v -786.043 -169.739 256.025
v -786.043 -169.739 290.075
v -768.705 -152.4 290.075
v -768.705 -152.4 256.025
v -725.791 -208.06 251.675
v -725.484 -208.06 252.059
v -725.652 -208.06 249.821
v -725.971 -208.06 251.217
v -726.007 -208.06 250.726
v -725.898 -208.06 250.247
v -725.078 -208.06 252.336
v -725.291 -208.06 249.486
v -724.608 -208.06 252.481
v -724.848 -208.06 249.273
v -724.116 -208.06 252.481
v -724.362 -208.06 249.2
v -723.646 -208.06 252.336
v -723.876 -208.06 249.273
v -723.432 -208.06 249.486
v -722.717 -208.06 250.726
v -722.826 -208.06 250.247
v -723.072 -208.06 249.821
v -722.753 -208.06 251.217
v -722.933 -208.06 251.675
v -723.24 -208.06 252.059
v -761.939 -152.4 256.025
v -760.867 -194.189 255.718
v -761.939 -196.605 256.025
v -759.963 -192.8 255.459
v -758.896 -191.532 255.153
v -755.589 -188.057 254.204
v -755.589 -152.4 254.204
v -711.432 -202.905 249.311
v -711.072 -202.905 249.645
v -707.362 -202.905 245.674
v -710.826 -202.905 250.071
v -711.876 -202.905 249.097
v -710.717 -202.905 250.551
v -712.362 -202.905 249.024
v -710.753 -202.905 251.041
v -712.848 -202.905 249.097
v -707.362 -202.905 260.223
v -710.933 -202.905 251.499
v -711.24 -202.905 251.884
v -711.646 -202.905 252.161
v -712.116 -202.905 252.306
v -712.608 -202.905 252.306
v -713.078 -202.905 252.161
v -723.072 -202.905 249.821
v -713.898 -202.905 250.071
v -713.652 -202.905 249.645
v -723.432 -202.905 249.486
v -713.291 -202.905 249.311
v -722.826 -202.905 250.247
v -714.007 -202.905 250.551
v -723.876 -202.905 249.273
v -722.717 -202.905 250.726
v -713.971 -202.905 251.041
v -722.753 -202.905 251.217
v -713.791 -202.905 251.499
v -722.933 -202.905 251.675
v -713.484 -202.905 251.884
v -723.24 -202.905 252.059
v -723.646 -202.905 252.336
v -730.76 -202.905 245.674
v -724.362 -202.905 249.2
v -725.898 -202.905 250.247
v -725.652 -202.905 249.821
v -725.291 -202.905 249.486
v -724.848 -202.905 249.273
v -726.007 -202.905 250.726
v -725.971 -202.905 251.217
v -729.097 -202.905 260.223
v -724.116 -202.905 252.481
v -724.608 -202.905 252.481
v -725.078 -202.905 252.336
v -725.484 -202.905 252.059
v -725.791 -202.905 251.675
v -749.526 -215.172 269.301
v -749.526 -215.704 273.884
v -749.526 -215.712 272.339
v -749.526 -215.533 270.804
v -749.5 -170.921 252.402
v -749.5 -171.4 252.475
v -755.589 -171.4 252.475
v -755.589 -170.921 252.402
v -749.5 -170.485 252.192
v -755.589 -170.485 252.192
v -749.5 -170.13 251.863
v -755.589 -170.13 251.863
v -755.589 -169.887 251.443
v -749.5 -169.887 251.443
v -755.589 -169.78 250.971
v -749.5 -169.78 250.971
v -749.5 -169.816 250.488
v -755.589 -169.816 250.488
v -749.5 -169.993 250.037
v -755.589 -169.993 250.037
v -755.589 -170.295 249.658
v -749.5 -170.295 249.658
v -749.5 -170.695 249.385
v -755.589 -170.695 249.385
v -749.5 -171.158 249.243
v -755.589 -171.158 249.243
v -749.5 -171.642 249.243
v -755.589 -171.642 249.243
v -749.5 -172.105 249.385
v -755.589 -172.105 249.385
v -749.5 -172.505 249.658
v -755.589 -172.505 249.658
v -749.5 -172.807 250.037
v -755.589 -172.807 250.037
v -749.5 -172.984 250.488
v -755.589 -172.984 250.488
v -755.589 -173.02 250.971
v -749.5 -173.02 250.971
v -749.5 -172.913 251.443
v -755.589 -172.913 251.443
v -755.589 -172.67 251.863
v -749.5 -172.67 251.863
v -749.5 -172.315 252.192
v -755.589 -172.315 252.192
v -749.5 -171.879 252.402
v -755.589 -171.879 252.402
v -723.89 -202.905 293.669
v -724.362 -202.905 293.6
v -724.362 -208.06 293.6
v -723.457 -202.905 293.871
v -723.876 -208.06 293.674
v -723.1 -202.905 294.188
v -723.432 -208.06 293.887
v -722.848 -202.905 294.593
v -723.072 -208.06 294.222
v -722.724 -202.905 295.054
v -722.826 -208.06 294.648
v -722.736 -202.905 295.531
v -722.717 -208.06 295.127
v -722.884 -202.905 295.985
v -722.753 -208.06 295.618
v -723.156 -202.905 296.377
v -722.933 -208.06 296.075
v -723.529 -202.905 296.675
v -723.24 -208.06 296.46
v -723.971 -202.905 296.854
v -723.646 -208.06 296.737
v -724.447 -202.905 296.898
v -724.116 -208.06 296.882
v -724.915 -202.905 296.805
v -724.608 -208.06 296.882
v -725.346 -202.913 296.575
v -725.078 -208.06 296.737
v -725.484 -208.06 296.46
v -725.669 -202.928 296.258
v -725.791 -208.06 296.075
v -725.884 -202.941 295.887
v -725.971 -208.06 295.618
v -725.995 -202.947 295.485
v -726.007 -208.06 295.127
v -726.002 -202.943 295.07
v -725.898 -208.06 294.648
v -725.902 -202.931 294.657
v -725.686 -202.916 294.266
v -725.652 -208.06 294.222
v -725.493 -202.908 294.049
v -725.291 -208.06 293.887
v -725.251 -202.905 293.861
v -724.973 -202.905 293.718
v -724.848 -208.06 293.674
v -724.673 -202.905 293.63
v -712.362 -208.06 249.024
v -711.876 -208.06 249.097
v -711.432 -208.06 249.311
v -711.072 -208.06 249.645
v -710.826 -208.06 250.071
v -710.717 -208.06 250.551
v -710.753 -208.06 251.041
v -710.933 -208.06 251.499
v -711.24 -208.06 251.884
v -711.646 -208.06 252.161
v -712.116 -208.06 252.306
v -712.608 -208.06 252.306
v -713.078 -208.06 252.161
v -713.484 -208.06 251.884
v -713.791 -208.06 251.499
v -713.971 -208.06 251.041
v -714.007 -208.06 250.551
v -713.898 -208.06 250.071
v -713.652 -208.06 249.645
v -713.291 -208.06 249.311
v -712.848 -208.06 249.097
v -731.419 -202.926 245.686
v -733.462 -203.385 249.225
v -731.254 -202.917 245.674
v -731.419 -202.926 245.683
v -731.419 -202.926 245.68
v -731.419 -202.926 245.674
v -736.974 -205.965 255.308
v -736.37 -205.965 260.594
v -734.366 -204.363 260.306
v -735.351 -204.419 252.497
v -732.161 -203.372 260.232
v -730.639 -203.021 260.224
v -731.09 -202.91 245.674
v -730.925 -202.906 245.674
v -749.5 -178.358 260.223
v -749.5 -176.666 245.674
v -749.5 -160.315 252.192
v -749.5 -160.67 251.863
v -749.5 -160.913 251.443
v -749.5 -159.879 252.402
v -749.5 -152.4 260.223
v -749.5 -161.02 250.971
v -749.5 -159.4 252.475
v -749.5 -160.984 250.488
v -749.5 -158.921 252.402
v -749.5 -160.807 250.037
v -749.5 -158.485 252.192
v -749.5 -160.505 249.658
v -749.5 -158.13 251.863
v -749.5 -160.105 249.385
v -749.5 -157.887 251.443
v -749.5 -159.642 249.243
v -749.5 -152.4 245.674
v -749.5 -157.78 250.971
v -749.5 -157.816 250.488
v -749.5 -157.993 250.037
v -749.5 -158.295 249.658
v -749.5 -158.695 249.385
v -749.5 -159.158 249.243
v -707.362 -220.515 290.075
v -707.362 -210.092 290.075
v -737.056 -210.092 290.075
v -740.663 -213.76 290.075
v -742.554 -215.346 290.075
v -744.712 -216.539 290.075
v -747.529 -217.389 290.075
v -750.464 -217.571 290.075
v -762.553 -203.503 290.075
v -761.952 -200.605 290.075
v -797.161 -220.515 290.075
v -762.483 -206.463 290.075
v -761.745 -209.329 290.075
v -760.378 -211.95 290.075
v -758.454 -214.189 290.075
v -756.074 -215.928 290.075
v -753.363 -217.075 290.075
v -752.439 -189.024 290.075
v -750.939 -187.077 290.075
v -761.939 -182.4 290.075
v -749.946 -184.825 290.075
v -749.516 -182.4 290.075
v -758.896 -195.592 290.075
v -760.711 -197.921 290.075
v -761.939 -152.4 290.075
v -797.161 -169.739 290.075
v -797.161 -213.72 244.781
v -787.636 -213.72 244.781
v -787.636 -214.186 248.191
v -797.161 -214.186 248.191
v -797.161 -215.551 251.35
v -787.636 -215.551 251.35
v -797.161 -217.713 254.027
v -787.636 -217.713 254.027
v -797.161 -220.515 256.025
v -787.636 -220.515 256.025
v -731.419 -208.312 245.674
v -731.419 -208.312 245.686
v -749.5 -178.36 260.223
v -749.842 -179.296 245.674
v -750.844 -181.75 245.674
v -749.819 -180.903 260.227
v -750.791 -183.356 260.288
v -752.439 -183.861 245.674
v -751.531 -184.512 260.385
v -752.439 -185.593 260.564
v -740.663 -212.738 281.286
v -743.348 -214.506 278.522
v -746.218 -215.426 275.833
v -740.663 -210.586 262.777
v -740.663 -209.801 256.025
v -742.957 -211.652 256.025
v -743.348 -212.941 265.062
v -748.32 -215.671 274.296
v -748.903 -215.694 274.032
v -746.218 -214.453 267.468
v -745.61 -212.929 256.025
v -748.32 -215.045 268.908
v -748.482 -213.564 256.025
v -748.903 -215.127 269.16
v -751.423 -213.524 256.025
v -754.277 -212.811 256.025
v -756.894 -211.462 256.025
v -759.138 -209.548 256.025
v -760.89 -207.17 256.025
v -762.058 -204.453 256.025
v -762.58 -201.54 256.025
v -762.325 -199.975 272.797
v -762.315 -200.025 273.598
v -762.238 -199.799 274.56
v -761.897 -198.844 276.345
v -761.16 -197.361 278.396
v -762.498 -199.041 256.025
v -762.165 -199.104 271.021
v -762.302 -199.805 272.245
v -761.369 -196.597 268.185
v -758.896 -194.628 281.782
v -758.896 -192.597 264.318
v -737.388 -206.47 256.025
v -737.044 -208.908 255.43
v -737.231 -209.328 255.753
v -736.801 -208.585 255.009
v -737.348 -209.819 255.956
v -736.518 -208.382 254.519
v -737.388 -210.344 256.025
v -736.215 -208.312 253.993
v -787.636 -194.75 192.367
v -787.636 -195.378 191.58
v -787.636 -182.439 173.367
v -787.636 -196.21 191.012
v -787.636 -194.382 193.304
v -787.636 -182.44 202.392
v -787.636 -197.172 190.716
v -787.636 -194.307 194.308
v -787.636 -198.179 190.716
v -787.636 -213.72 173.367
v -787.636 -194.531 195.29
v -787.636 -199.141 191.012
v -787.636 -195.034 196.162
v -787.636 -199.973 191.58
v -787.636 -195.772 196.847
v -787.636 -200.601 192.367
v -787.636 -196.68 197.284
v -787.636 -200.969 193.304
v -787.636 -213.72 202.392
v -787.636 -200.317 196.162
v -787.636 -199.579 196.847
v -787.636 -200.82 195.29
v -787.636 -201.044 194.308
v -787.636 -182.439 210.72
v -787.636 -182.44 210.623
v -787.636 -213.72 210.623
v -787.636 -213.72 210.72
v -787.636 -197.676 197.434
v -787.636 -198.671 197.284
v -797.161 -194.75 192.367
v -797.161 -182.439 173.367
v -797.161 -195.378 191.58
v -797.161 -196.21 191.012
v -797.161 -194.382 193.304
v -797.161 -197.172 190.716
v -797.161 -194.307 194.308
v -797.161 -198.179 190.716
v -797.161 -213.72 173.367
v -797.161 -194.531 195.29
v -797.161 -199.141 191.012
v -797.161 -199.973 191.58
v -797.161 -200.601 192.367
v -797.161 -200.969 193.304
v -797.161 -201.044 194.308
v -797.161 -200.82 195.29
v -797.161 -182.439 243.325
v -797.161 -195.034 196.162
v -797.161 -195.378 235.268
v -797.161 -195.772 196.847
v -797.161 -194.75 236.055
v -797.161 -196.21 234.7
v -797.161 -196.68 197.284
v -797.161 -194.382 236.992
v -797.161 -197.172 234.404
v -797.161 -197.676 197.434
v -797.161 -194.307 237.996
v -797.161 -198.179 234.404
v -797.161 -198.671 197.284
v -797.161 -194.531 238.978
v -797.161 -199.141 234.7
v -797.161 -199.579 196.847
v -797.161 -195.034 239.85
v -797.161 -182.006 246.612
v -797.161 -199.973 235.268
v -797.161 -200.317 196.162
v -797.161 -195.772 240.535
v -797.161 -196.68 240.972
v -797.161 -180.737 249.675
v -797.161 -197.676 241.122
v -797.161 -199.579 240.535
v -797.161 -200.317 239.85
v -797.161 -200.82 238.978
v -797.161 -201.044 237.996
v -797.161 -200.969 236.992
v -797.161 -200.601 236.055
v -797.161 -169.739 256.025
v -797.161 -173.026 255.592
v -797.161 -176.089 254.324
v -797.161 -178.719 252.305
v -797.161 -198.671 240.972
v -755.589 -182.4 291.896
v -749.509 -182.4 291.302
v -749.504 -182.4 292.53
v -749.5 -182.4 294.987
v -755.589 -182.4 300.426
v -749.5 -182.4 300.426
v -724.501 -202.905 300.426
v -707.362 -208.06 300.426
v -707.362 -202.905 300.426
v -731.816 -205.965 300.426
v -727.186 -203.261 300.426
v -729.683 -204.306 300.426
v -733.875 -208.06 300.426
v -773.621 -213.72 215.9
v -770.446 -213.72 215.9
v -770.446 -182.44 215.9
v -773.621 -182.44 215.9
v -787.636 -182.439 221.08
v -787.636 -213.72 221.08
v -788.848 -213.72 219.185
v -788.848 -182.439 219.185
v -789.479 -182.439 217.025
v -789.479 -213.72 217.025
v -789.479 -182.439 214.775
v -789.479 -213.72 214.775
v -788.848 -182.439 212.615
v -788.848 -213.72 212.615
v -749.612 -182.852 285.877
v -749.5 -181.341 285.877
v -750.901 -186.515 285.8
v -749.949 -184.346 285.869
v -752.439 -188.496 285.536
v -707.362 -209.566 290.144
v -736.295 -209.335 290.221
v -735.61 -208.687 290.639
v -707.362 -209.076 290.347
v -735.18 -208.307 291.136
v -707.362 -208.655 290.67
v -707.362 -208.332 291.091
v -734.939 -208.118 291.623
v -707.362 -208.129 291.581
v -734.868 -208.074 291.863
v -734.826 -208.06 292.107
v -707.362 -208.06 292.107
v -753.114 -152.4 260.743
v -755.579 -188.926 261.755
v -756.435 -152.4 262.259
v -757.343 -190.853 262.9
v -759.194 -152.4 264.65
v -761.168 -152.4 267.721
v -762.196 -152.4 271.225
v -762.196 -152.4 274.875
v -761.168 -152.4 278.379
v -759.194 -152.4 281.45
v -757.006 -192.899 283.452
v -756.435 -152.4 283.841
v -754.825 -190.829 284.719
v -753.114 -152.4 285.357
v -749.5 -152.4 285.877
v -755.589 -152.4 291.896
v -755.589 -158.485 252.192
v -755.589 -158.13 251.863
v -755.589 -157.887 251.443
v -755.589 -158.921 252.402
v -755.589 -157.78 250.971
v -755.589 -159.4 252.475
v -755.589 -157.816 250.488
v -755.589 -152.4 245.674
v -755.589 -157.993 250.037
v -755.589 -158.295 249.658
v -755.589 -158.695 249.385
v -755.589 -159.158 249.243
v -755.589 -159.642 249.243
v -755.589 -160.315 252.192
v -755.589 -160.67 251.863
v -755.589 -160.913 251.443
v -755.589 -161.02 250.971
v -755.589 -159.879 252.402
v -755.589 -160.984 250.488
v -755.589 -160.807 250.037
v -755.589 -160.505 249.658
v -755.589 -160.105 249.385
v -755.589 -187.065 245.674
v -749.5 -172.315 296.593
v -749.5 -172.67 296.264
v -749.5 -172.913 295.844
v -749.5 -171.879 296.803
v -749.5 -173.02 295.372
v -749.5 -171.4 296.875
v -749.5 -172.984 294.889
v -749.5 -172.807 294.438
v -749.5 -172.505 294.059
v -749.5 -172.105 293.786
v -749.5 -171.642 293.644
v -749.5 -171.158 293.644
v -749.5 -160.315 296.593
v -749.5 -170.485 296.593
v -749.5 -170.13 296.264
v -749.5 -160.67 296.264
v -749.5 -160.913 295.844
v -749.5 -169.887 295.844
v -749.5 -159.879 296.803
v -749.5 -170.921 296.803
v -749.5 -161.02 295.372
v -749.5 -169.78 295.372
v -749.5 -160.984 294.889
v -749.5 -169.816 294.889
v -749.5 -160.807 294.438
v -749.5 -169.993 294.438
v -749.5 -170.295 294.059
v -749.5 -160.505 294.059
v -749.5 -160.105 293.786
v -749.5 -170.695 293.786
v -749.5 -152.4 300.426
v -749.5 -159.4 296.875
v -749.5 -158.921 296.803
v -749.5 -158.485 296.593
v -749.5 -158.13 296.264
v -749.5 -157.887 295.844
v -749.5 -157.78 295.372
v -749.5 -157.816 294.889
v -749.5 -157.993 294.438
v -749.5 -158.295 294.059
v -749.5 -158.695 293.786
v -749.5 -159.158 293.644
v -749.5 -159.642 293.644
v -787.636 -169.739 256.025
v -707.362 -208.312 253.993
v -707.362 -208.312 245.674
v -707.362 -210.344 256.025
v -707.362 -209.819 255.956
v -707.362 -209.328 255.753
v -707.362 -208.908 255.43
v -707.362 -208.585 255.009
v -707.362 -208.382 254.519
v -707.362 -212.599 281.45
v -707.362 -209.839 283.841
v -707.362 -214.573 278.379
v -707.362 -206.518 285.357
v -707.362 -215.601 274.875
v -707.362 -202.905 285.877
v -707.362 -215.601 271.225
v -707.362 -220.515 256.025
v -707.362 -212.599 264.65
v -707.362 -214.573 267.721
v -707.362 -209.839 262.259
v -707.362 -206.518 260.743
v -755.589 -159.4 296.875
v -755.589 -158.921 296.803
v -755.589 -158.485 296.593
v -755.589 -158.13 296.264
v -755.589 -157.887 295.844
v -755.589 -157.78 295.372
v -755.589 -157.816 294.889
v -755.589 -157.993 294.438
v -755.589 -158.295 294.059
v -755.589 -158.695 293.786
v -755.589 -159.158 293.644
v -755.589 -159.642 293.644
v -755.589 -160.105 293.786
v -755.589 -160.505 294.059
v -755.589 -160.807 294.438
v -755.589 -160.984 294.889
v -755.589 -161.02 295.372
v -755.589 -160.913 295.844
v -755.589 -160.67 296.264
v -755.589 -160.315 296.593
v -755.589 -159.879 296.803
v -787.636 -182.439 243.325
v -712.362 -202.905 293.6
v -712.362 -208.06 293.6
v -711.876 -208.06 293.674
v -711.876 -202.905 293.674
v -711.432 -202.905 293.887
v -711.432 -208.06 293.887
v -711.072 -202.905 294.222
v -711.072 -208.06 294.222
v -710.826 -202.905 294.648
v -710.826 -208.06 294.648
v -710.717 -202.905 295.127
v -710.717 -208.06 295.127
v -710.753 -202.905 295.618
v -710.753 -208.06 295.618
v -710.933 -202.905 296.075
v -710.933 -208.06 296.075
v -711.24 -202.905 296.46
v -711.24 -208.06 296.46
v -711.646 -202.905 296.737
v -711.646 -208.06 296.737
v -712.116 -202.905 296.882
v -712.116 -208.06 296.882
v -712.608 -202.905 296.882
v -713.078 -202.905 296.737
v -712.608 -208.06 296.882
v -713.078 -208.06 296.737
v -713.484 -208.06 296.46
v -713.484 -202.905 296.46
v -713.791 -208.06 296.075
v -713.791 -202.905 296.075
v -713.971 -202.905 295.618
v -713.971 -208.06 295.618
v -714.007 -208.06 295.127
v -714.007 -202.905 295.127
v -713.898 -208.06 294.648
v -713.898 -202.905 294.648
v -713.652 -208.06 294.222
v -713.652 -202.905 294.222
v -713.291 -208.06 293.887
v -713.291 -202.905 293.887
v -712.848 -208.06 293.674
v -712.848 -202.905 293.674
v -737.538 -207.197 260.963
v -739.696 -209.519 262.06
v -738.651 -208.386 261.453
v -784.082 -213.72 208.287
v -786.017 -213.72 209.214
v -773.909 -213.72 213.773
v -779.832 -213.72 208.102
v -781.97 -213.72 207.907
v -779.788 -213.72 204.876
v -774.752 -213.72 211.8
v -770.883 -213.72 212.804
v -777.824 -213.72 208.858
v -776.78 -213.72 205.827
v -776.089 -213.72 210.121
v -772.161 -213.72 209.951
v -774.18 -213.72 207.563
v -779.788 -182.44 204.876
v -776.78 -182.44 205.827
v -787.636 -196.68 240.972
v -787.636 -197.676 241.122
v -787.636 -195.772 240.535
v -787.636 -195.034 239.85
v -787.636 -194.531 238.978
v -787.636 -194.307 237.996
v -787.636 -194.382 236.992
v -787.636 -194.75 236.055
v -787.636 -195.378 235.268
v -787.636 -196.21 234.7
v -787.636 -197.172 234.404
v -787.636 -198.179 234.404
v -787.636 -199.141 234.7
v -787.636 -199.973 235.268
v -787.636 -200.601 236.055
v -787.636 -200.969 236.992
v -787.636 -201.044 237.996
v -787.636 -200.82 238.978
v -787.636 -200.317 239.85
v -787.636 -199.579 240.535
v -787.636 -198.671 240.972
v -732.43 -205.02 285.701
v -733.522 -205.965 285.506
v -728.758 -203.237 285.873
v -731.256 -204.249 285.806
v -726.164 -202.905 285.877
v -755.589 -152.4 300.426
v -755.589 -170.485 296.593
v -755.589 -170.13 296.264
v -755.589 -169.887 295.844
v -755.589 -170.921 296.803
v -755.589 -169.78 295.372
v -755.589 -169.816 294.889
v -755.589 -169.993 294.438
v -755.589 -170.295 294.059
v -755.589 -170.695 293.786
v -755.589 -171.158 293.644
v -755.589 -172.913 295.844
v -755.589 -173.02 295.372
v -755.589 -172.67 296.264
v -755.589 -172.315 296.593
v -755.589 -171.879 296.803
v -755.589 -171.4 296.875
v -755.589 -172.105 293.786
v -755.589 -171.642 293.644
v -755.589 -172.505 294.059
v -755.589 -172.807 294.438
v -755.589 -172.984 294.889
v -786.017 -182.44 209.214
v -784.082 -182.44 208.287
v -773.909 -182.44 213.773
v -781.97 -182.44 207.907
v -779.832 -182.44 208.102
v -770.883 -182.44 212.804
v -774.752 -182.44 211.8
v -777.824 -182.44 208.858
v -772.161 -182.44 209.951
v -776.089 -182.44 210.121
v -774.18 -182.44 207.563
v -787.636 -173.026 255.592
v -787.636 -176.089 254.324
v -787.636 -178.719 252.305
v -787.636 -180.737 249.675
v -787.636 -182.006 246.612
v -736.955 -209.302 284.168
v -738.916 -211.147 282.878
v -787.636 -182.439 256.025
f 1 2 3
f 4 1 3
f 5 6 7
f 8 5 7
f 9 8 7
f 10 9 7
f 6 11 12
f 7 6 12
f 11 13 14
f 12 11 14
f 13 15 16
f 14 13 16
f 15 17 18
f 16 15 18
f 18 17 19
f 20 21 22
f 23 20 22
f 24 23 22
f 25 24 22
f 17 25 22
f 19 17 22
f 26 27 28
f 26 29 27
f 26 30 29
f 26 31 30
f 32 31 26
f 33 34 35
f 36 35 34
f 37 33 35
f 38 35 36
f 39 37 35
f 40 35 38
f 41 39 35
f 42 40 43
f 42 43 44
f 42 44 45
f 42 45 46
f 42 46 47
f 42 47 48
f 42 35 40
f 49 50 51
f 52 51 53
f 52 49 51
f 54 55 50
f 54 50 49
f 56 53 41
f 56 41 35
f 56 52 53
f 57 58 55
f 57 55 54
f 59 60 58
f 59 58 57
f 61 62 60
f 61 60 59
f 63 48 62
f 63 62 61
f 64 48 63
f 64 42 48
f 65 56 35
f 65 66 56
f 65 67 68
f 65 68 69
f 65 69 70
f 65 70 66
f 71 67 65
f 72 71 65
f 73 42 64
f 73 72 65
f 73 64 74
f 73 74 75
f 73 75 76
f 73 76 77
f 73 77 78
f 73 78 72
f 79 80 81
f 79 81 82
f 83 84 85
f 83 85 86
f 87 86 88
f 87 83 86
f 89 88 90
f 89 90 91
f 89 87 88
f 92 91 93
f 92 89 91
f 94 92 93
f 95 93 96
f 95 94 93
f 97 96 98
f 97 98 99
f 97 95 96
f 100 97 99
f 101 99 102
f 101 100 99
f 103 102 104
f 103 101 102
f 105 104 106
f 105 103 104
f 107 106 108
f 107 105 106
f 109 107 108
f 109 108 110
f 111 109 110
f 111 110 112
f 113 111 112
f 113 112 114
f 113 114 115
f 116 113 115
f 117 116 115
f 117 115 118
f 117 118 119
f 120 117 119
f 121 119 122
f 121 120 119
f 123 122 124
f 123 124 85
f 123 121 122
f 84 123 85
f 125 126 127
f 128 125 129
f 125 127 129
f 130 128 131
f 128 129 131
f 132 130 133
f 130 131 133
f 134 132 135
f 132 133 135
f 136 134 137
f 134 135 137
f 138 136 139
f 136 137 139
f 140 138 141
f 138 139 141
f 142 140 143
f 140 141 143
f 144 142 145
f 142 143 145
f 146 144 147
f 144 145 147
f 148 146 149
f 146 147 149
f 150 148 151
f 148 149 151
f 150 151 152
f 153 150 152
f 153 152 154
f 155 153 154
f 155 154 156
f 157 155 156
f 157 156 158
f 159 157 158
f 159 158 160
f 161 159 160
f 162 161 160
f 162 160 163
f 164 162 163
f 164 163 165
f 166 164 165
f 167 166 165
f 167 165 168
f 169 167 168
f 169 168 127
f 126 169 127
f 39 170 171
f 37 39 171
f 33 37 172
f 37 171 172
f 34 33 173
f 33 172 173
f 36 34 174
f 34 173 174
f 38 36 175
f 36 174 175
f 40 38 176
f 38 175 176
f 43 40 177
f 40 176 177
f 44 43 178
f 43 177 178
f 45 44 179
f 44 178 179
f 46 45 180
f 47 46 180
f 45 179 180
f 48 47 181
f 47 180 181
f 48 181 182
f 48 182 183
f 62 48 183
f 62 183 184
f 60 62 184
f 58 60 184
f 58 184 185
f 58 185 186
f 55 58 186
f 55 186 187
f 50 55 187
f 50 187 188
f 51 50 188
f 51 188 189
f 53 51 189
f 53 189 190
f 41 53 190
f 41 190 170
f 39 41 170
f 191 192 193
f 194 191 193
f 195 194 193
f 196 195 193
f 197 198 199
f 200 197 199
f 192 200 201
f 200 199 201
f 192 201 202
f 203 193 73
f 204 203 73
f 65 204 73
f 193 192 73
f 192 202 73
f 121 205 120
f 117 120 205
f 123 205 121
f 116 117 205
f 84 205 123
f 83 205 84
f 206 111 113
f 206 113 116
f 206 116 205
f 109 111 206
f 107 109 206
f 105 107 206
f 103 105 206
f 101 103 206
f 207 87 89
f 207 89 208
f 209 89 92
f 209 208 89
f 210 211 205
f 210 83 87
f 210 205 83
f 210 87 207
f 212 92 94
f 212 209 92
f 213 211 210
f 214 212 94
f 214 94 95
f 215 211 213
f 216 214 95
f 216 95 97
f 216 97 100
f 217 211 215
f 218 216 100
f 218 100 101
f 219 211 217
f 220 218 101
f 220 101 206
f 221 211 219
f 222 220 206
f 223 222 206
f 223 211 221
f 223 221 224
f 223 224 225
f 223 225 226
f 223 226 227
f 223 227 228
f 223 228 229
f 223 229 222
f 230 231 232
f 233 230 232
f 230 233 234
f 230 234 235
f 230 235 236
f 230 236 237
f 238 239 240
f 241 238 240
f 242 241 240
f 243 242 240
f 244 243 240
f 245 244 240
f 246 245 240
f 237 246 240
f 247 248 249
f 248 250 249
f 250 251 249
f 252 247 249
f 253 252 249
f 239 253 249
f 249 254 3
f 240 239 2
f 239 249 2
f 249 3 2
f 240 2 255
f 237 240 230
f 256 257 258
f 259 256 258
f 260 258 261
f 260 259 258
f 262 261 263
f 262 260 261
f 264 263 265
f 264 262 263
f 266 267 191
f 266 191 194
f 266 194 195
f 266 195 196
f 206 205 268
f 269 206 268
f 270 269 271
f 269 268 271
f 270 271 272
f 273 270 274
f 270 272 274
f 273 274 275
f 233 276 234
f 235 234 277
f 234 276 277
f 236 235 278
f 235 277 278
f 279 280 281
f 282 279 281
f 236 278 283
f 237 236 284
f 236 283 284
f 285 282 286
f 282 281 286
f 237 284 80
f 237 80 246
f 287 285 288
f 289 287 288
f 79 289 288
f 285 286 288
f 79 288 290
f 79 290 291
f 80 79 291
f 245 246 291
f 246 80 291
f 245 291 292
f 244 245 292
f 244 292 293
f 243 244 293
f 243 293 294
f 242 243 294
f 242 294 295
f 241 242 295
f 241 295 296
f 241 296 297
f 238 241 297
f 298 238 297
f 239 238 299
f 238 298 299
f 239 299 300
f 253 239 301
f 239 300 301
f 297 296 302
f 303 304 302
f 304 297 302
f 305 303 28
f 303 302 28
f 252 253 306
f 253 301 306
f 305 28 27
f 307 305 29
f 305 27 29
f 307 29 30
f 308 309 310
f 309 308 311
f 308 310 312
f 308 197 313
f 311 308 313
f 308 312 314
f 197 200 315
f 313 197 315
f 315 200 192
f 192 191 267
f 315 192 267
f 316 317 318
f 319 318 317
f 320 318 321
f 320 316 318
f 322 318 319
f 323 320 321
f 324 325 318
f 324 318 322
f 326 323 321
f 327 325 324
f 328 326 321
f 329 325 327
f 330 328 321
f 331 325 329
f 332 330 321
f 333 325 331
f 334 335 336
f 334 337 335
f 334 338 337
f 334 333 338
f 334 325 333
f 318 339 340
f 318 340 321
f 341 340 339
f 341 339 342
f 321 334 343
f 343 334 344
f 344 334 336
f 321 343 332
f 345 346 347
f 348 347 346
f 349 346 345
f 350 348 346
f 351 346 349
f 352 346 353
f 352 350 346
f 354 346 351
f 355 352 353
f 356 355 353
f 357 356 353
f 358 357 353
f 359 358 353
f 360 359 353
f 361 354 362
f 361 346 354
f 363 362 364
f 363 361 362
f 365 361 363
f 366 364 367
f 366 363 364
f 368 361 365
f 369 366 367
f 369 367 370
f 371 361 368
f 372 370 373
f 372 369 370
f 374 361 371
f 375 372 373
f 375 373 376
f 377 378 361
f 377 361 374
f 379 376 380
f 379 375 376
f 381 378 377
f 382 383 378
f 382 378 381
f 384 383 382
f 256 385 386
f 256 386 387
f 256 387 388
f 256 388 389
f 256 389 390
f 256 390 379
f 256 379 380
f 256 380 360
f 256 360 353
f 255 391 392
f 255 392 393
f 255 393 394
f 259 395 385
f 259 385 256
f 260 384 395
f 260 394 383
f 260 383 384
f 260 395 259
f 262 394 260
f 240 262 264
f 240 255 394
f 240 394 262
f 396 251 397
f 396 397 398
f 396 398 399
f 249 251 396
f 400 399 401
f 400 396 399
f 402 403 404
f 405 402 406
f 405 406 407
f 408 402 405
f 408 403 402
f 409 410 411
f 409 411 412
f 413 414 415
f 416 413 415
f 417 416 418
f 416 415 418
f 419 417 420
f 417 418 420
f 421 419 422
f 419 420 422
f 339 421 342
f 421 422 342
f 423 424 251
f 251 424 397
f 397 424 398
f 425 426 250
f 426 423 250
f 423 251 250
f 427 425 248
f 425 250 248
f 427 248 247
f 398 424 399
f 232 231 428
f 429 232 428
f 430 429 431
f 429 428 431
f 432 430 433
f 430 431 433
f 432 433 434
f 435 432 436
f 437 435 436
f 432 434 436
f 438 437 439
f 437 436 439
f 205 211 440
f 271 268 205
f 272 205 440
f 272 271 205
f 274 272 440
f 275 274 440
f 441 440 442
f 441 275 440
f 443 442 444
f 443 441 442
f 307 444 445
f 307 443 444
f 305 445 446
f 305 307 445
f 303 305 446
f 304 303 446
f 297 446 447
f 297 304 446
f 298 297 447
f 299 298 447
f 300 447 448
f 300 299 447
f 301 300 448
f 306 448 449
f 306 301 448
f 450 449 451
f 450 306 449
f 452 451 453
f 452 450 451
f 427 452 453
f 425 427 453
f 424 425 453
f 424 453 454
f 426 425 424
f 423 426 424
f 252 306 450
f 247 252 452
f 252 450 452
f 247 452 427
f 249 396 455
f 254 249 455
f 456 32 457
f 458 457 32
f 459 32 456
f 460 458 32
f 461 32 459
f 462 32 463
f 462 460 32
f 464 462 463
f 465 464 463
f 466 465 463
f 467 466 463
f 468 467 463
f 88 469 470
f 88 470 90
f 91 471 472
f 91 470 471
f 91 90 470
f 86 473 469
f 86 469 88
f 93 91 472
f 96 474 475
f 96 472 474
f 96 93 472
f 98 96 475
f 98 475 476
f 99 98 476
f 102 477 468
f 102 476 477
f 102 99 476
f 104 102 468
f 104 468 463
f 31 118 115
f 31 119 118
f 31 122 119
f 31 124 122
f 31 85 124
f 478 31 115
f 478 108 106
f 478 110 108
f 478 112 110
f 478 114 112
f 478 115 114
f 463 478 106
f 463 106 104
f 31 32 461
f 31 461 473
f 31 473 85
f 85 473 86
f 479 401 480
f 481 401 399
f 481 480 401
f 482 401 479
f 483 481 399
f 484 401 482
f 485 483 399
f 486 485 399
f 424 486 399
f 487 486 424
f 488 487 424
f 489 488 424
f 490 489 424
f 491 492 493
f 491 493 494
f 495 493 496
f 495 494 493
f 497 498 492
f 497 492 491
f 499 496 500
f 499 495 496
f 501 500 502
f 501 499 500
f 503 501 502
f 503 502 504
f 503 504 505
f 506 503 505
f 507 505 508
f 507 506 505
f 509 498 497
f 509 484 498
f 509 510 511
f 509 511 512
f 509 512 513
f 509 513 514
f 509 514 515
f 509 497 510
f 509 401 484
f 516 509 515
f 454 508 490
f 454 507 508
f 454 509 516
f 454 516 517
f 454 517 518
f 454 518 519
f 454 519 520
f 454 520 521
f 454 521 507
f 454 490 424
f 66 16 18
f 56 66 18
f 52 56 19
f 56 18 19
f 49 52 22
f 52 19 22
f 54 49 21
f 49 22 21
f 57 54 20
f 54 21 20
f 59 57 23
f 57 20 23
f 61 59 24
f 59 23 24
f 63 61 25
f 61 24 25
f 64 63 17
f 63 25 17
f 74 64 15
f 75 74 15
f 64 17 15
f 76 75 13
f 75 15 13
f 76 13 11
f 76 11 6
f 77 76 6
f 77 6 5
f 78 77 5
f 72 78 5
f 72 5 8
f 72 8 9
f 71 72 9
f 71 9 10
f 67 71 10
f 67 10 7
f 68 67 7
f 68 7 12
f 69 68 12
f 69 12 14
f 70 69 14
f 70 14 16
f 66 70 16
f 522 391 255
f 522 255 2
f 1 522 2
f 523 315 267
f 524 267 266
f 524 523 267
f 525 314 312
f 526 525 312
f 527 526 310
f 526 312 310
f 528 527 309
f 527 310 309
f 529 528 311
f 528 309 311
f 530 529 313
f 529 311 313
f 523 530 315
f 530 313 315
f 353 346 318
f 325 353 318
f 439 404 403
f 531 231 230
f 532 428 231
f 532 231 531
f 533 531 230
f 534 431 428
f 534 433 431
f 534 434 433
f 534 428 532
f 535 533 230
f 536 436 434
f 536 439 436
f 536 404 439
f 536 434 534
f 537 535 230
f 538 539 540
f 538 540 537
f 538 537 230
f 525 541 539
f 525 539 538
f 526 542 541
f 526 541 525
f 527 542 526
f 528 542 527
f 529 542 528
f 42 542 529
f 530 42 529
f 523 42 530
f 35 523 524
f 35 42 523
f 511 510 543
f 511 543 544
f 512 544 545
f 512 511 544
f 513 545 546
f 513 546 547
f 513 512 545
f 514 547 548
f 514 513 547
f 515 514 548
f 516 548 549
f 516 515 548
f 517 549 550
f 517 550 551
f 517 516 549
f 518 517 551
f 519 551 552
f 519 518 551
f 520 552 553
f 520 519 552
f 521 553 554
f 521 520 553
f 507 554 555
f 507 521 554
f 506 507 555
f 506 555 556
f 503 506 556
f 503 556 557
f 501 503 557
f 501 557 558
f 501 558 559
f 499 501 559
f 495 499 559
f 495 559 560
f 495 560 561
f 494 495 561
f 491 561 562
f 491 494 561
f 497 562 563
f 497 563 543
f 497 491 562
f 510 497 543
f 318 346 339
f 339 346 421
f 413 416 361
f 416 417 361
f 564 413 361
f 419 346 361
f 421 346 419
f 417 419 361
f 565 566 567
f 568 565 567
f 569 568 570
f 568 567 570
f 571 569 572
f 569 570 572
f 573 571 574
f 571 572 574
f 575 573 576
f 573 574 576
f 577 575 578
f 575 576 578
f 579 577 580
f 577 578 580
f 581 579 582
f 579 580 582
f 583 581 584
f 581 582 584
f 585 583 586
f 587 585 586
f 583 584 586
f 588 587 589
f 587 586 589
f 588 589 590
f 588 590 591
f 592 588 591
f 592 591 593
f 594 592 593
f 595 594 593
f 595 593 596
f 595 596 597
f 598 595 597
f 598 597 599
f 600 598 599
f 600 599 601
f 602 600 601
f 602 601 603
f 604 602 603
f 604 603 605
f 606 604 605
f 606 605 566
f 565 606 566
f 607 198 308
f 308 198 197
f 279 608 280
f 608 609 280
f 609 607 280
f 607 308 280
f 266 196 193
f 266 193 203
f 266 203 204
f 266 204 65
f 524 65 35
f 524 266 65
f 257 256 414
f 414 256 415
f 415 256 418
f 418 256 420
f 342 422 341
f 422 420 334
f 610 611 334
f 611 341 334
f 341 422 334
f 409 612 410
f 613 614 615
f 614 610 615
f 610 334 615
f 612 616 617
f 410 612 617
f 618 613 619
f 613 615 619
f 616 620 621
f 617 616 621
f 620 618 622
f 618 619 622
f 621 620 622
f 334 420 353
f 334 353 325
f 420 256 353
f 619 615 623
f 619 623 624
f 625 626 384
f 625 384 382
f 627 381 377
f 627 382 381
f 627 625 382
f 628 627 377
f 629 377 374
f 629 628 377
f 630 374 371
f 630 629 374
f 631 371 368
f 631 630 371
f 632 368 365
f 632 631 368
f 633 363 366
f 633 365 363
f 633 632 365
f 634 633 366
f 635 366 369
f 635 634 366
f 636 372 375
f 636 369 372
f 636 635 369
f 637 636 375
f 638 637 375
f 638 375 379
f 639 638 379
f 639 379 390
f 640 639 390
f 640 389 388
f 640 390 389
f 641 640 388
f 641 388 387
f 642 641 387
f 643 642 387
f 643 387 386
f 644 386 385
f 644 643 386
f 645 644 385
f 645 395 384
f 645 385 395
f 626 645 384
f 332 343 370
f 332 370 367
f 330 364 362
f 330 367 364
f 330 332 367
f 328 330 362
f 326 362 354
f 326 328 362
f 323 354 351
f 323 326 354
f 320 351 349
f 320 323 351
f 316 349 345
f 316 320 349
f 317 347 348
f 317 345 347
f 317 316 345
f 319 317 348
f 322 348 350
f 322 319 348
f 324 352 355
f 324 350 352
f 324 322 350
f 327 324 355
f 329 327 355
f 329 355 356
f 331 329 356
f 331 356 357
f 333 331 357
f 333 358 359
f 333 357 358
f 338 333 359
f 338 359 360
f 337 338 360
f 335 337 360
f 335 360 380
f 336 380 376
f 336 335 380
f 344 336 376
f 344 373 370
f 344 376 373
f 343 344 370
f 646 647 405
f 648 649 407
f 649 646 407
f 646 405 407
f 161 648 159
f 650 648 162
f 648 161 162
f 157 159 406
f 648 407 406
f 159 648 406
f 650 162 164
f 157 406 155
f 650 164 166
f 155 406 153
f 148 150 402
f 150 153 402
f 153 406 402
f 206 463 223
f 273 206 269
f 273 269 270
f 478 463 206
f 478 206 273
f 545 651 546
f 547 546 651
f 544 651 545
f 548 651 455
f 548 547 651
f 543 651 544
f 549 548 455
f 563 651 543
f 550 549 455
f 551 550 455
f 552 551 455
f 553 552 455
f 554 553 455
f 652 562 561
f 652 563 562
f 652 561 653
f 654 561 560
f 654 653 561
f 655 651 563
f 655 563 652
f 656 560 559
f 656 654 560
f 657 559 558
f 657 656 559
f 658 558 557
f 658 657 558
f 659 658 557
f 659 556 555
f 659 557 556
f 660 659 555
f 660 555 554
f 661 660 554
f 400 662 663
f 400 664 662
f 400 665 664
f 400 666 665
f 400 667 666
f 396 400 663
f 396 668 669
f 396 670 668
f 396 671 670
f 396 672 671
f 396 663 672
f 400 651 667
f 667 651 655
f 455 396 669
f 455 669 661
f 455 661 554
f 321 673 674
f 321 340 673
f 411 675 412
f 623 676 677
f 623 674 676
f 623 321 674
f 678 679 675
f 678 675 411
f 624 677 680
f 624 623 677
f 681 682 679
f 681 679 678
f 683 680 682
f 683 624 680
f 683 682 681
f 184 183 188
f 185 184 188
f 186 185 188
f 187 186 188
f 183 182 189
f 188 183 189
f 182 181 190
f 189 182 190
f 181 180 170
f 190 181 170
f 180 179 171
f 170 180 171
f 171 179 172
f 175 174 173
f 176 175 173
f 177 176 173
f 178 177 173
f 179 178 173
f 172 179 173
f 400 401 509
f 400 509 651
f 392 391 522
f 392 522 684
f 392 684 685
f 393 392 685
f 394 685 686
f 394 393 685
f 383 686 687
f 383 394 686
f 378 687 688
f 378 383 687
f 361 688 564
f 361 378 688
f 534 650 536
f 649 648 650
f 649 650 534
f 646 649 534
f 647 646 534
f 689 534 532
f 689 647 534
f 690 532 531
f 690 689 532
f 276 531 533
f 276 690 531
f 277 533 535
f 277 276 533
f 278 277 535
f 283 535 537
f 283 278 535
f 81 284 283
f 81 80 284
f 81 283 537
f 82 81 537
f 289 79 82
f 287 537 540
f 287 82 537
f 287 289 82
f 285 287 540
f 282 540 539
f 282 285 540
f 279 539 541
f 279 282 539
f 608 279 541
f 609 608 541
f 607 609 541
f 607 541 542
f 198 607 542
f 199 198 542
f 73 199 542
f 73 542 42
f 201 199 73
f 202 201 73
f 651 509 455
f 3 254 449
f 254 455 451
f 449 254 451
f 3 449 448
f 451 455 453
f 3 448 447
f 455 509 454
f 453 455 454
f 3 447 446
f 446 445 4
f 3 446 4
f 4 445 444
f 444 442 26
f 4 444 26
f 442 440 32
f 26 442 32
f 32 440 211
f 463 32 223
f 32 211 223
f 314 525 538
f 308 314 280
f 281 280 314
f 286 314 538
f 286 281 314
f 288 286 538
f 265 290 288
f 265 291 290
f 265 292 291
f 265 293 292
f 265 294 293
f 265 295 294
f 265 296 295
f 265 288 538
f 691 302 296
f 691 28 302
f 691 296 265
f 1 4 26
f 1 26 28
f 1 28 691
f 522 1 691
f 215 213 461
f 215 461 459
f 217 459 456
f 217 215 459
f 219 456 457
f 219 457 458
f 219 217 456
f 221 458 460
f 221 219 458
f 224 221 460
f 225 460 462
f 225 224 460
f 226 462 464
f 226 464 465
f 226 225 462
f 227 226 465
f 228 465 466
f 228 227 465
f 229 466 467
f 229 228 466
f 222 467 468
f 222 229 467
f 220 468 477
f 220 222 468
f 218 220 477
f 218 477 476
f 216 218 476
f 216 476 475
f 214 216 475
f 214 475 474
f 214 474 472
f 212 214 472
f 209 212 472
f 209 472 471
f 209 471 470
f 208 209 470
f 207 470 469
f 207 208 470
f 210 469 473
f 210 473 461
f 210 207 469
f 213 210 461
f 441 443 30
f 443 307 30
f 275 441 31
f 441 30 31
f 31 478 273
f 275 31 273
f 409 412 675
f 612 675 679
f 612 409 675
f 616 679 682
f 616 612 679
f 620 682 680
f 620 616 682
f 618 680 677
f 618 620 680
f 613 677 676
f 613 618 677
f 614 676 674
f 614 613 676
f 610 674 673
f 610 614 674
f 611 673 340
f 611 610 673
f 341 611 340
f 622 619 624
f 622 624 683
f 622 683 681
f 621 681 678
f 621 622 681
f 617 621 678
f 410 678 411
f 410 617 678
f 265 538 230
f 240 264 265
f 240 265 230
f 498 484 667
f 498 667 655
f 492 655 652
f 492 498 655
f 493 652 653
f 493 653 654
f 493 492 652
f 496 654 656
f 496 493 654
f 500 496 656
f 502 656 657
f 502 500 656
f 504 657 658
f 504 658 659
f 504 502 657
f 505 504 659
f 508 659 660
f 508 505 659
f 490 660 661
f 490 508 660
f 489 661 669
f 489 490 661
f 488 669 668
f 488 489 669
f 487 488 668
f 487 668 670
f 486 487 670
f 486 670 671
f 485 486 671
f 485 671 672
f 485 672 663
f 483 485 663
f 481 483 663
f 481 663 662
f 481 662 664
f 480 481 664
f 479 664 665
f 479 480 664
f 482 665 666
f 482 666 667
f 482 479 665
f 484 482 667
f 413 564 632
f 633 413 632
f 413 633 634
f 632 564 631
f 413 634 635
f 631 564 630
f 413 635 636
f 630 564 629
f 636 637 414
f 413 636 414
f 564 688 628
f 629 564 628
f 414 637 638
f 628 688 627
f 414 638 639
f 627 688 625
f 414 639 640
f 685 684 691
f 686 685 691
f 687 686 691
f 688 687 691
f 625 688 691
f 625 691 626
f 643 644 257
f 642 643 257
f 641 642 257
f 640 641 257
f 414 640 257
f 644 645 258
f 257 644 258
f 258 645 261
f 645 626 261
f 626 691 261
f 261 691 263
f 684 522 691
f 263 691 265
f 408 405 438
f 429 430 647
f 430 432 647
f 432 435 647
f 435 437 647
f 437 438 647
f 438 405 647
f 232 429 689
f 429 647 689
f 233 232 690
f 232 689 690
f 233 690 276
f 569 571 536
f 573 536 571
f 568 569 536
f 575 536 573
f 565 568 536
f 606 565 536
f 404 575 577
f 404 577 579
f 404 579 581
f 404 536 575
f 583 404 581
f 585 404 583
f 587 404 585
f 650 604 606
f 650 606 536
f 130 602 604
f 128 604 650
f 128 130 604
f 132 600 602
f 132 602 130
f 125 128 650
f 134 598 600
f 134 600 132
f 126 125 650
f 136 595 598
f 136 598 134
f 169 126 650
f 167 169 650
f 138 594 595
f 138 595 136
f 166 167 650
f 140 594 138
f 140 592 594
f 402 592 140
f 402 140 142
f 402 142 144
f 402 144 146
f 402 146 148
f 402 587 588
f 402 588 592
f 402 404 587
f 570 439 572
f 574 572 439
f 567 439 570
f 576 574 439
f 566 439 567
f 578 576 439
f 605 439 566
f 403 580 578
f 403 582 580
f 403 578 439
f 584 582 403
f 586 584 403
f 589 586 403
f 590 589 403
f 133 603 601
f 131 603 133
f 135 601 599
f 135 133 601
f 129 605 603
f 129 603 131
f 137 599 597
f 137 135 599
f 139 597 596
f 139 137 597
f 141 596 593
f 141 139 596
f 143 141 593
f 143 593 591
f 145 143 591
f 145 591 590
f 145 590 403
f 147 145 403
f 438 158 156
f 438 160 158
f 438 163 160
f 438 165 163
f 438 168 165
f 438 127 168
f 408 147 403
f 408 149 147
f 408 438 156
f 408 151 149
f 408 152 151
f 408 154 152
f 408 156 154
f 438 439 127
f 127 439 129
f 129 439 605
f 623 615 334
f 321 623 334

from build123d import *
from OCP.BRepFilletAPI import BRepFilletAPI_MakeChamfer
from build123d.topology import SkipClean

# Parameters (mm, degrees)
BOSS_EXTRUDE1_START      = -152.4
SKETCH2_W                = 105.618637884
SKETCH2_H                = 145.103309092
BOSS_EXTRUDE1_DEPTH      = 139.7
CUT_EXTRUDE2_DEPTH       = 885.237993682
CUT_EXTRUDE2_DEPTH_BACK  = 51.562
SKETCH5_R                = 12.827
CUT_EXTRUDE3_DEPTH       = 445.860765858
CUT_EXTRUDE3_DEPTH_BACK  = 42.164
SKETCH6_R                = 12.827
CUT_EXTRUDE4_DEPTH       = 445.860765858
CUT_EXTRUDE4_DEPTH_BACK  = 445.860765858
CUT_EXTRUDE5_DEPTH       = 50.504651
CUT_EXTRUDE6_DEPTH       = 407.363854058
CUT_EXTRUDE6_DEPTH_BACK  = 407.363854058
SKETCH9_R                = 3.3782
CUT_EXTRUDE7_DEPTH       = 877.507710408
CUT_EXTRUDE7_DEPTH_BACK  = 877.507710408
SKETCH10_W               = 42.138106051
SKETCH10_H               = 18.044478892
SKETCH14_W               = 10.350939284
SKETCH14_H               = 12.032329604
CUT_EXTRUDE9_DEPTH       = 389.423133713
SKETCH15_R               = 7.9375
CUT_EXTRUDE10_DEPTH      = 855.097071361
BOSS_EXTRUDE3_DEPTH      = 31.28
CUT_EXTRUDE11_REACH      = 385.336
SKETCH17_W               = 10.350939284
SKETCH17_H               = 5.407782796
CUT_EXTRUDE12_REACH      = 385.336
SKETCH18_W               = 82.65793149
SKETCH18_H               = 30.038621058
SKETCH20_R               = 1.625
CUT_EXTRUDE13_DEPTH      = 6.088729488
SKETCH21_R               = 1.65
CUT_EXTRUDE14_DEPTH      = 854.709330565
FILLET1_R                = 2.032
FILLET2_R                = 12.7
CUT_EXTRUDE15_DEPTH      = 825.577740132
CUT_EXTRUDE15_DEPTH_BACK = 825.577740132
FILLET3_R                = 10.16
CUT_EXTRUDE16_DEPTH      = 855.611797525
CUT_EXTRUDE16_DEPTH_BACK = 17.338621
SKETCH23_W               = 28.46620038
SKETCH23_H               = 34.049959426
CHAMFER1_SIZE            = 17.3482
CHAMFER2_START           = -213.720216756
CHAMFER2_DEPTH           = 31.28
CHAMFER2_2_DEPTH         = 31.28
CHAMFER3_SIZE            = 5.969
CHAMFER3_SIZE2           = 10.33861127
CHAMFER4_SIZE            = 6.35
CHAMFER4_SIZE2           = 1.8208332


with BuildPart() as part:
    # Sketch2 → Boss-Extrude1 (new body)
    with BuildSketch(Plane(origin=(0, 0, 0), x_dir=(1, 0, 0), z_dir=(0, 1, 0)).offset(BOSS_EXTRUDE1_START)):
        with Locations((-760.171212891, -245.918743343)):
            Rectangle(SKETCH2_W, SKETCH2_H)
    extrude(amount=-BOSS_EXTRUDE1_DEPTH)

    # Sketch5 → Cut-Extrude2 (cut, two sides: drawn at the far end of the back side and taken through both)
    with BuildSketch(Plane(origin=(0, -152.4, 0), x_dir=(1, 0, 0), z_dir=(0, 1, 0)).offset(-CUT_EXTRUDE2_DEPTH_BACK)):
        with Locations(Location((-749.5, -273.05, 0), (0, 0, 90))):
            Circle(SKETCH5_R)
    extrude(amount=CUT_EXTRUDE2_DEPTH + CUT_EXTRUDE2_DEPTH_BACK, mode=Mode.SUBTRACT)

    # Sketch6 → Cut-Extrude3 (cut, two sides: drawn at the far end of the back side and taken through both)
    with SkipClean():  # the faces are left unmerged after this step: merging them gives an invalid solid
        with BuildSketch(Plane(origin=(-707.361893949, 0, 0), x_dir=(0, 0, -1), z_dir=(1, 0, 0)).offset(-CUT_EXTRUDE3_DEPTH_BACK)):
            with Locations((-273.05, -202.904651163)):
                Circle(SKETCH6_R)
        extrude(amount=CUT_EXTRUDE3_DEPTH + CUT_EXTRUDE3_DEPTH_BACK, mode=Mode.SUBTRACT)

    # Sketch7 → Cut-Extrude4 (cut, two sides: drawn at the far end of the back side and taken through both)
    with SkipClean():  # the faces are left unmerged after this step: merging them gives an invalid solid
        with BuildSketch(Plane.ZY.offset(812.980531833).offset(-CUT_EXTRUDE4_DEPTH_BACK)):
            Polygon((173.367088797, -229.244173065), (318.470397889, -229.244173065), (436.616381599, -1092.879705033), (85.103632852, -1063.090489038), align=None)
        extrude(amount=CUT_EXTRUDE4_DEPTH + CUT_EXTRUDE4_DEPTH_BACK, mode=Mode.SUBTRACT)

    # Sketch8 → Cut-Extrude5 (cut)
    with BuildSketch(Plane.XZ.offset(152.4)):
        Polygon((-749.5, 285.877), (-749.5, 318.470397889), (-702.312681678, 322.788236882), (-679.04046523, 133.358726973), (-749.5, 173.367088797), (-749.5, 260.223), align=None)
    extrude(amount=CUT_EXTRUDE5_DEPTH, mode=Mode.SUBTRACT)

    # Sketch9 → Cut-Extrude6 (cut, two sides: drawn at the far end of the back side and taken through both)
    with BuildSketch(Plane.ZY.offset(812.980531833).offset(-CUT_EXTRUDE6_DEPTH_BACK)):
        with Locations((237.744, -197.6755)):
            Circle(SKETCH9_R)
        with Locations((194.056, -197.6755)):
            Circle(SKETCH9_R)
    extrude(amount=CUT_EXTRUDE6_DEPTH + CUT_EXTRUDE6_DEPTH_BACK, mode=Mode.SUBTRACT)

    # Sketch10 → Cut-Extrude7 (cut, two sides: drawn at the far end of the back side and taken through both)
    with BuildSketch(Plane(origin=(0, -152.4, 0), x_dir=(1, 0, 0), z_dir=(0, 1, 0)).offset(-CUT_EXTRUDE7_DEPTH_BACK)):
        Polygon((-797.161154045, -290.074979713), (-797.161154045, -173.367088797), (-812.980531833, -173.367088797), (-812.980531833, -318.470397889), (-778.610494828, -318.470397889), (-749.5, -318.470397889), (-749.5, -300.425918997), (-755.588729488, -300.425918997), (-755.588729488, -290.074979713), align=None)
        with BuildLine():
            Line((-704.994967799, -245.674081003), (-704.994967799, -173.367088797))
            Line((-704.994967799, -173.367088797), (-749.5, -173.367088797))
            Line((-749.5, -173.367088797), (-749.5, -245.674081003))
            Line((-749.5, -245.674081003), (-749.5, -254.969))
            ThreePointArc((-749.5, -254.969), (-746.410185862, -255.23496114), (-743.411270512, -256.025020287))
            Line((-743.411270512, -256.025020287), (-731.419, -256.025020287))
            Line((-731.419, -256.025020287), (-731.419, -245.674081003))
            Line((-731.419, -245.674081003), (-704.994967799, -245.674081003))
        make_face()
        Polygon((-749.5, -245.674081003), (-749.5, -173.367088797), (-787.636154045, -173.367088797), (-787.636154045, -256.025020287), (-755.588729488, -256.025020287), (-755.588729488, -245.674081003), align=None)
        with Locations((-728.430946975, -309.448158443)):
            Rectangle(SKETCH10_W, SKETCH10_H)
    extrude(amount=CUT_EXTRUDE7_DEPTH + CUT_EXTRUDE7_DEPTH_BACK, mode=Mode.SUBTRACT)

    # Sketch14 → Cut-Extrude9 (cut, through all)
    with BuildSketch(Plane.ZY.offset(797.161154045)):
        Polygon((173.367088797, -229.244173065), (173.367088797, -213.720216756), (256.025020287, -213.720216756), (256.025020287, -220.515241206), (290.074979713, -220.515241206), (290.074979713, -208.059525422), (300.425918997, -208.059525422), (300.425918997, -229.244173065), (290.074979713, -229.244173065), (256.025020287, -229.244173065), align=None)
        with Locations((295.250449355, -188.416164802)):
            Rectangle(SKETCH14_W, SKETCH14_H)
    extrude(amount=-CUT_EXTRUDE9_DEPTH, mode=Mode.SUBTRACT)

    # Sketch15 → Cut-Extrude10 (cut, through all)
    with BuildSketch(Plane.XZ.offset(213.720216756)):
        with Locations((-781.622028853, 215.9)):
            Circle(SKETCH15_R)
    extrude(amount=-CUT_EXTRUDE10_DEPTH, mode=Mode.SUBTRACT)

    # Sketch16 → Boss-Extrude3 (add)
    with BuildSketch(Plane.XZ.offset(213.720216756)):
        with BuildLine():
            Line((-789.623028853, 215.9), (-792.798028853, 215.9))
            ThreePointArc((-792.798028853, 215.9), (-781.622028853, 204.724), (-770.446028853, 215.9))
            Line((-770.446028853, 215.9), (-773.621028853, 215.9))
            ThreePointArc((-773.621028853, 215.9), (-781.622028853, 207.899), (-789.623028853, 215.9))
        make_face()
    extrude(amount=-BOSS_EXTRUDE3_DEPTH)

    # Cut-Extrude11: up to this face of the body (flat: up to its plane)
    cut_extrude11_end = Plane(part.part.faces().sort_by_distance((-787.636154045, -182.811410497, 238.56635645))[0])
    # Sketch17 → Cut-Extrude11 (cut, up to the picked face)
    with BuildSketch(Plane(origin=(-707.361893949, 0, 0), x_dir=(0, 0, -1), z_dir=(1, 0, 0)), mode=Mode.PRIVATE) as cut_extrude11_sk1:
        with Locations((-250.849550645, -211.016325358)):
            Rectangle(SKETCH17_W, SKETCH17_H)
    cut_extrude11_tool1 = split(extrude(cut_extrude11_sk1.sketch, amount=-CUT_EXTRUDE11_REACH, mode=Mode.PRIVATE), bisect_by=cut_extrude11_end, keep=Keep.BOTH, mode=Mode.PRIVATE)
    add(cut_extrude11_tool1.solids().sort_by(Axis((-707.361894, -211.016325, 250.849551), (-1, 0, 0)))[0], mode=Mode.SUBTRACT)

    # Cut-Extrude12: up to this face of the body (flat: up to its plane)
    cut_extrude12_end = Plane(part.part.faces().sort_by_distance((-787.636154045, -181.897567062, 191.002801609))[0])
    # Sketch18 → Cut-Extrude12 (cut, up to the picked face)
    with BuildSketch(Plane.ZY.offset(797.161154045), mode=Mode.PRIVATE) as cut_extrude12_sk1:
        with Locations((214.696054542, -167.419310529)):
            Rectangle(SKETCH18_W, SKETCH18_H)
    cut_extrude12_tool1 = split(extrude(cut_extrude12_sk1.sketch, amount=-CUT_EXTRUDE12_REACH, mode=Mode.PRIVATE), bisect_by=cut_extrude12_end, keep=Keep.BOTH, mode=Mode.PRIVATE)
    add(cut_extrude12_tool1.solids().sort_by(Axis((-797.161154, -167.419311, 214.696055), (1, 0, 0)))[0], mode=Mode.SUBTRACT)

    # Sketch20 → Cut-Extrude13 (cut)
    with BuildSketch(Plane.ZY.offset(749.5)):
        with Locations((295.250449355, -159.4)):
            Circle(SKETCH20_R)
        with Locations((295.250449355, -171.4)):
            Circle(SKETCH20_R)
        with Locations((250.849550645, -159.4)):
            Circle(SKETCH20_R)
        with Locations((250.849550645, -171.4)):
            Circle(SKETCH20_R)
    extrude(amount=CUT_EXTRUDE13_DEPTH, mode=Mode.SUBTRACT)

    # Sketch21 → Cut-Extrude14 (cut, through all)
    with BuildSketch(Plane.XZ.offset(208.059525422)):
        with Locations(Location((-724.361893949, 295.250449355, 0), (0, 0, 270))):
            Circle(SKETCH21_R)
        with Locations(Location((-712.361893949, 295.250449355, 0), (0, 0, 270))):
            Circle(SKETCH21_R)
        with Locations(Location((-724.361893949, 250.849550645, 0), (0, 0, 270))):
            Circle(SKETCH21_R)
        with Locations(Location((-712.361893949, 250.674081003, 0), (0, 0, 270))):
            Circle(SKETCH21_R)
    extrude(amount=-CUT_EXTRUDE14_DEPTH, mode=Mode.SUBTRACT)

    # Fillet1
    fillet1_edges = [part.edges().sort_by_distance(p)[0] for p in [
        (-731.475311718, -208.059525422, 290.074979713),
        (-719.390446974, -208.31243396, 256.025020287),
    ]]
    fillet(fillet1_edges, radius=FILLET1_R)

    # Fillet2
    # the kernel refuses this fillet: 12.7 mm, written as the material it adds along each edge
    with BuildSketch(Plane(origin=(-797.161154045, -213.720216756, 256.025020287), x_dir=(0, -1, 0), z_dir=(1, 0, 0))) as fillet2_piece_1:
        with BuildLine():
            CenterArc((12.7, 11.243721081), FILLET2_R, 180, 62.292450476)
            Line((0, 11.243721081), (-0.254, 11.243721081))
            Line((-0.254, 11.243721081), (-0.254, 0))
            Line((-0.254, 0), (0, -0.254))
            ThreePointArc((0, -0.254), (3.397512225, -0.254), (6.676924939, -0.224874422))
            Line((6.676924939, -0.224874422), (6.79502445, 0))
        make_face()
    extrude(amount=9.525)
    with BuildSketch(Plane(origin=(-797.161154045, -182.438621058, 256.025020287), x_dir=(0, 1, 0), z_dir=(1, 0, 0))) as fillet2_piece_2:
        with BuildLine():
            CenterArc((FILLET2_R, -FILLET2_R), FILLET2_R, 90, 90)
            Line((0, -FILLET2_R), (-FILLET2_R * 0.02, -FILLET2_R))
            Line((-FILLET2_R * 0.02, -FILLET2_R), (-FILLET2_R * 0.02, FILLET2_R * 0.02))
            Line((-FILLET2_R * 0.02, FILLET2_R * 0.02), (FILLET2_R, FILLET2_R * 0.02))
            Line((FILLET2_R, FILLET2_R * 0.02), (FILLET2_R, 0))
        make_face()
    extrude(amount=9.525)

    # Sketch22 → Cut-Extrude15 (cut, two sides: drawn at the far end of the back side and taken through both)
    with BuildSketch(Plane(origin=(0, -30.880009338, 265.568080309), x_dir=(1, 0, 0), z_dir=(0, -0.11550085817456393, 0.9933073803012538)).offset(-CUT_EXTRUDE15_DEPTH_BACK)):
        with BuildLine():
            Line((-758.896109044, -160.779431747), (-743.9675024, -145.695751323))
            Line((-743.9675024, -145.695751323), (-725.733898271, -163.741897627))
            Line((-725.733898271, -163.741897627), (-740.662504915, -178.825578052))
            ThreePointArc((-740.662504915, -178.825578052), (-758.802380132, -178.919306964), (-758.896109044, -160.779431747))
        make_face()
    extrude(amount=CUT_EXTRUDE15_DEPTH + CUT_EXTRUDE15_DEPTH_BACK, mode=Mode.SUBTRACT)

    # Fillet3
    # the kernel refuses this fillet: 10.16 mm, written as the material it takes off along each edge
    with BuildSketch(Plane(origin=(-749.5, -183.769844105, 270.597328126), x_dir=(-0.7034437633396176, -0.7059941354664443, -0.08209234133330717), z_dir=(0, 0.11550085817456394, -0.9933073803012537))) as fillet3_piece_1:
        with BuildLine():
            CenterArc((FILLET3_R * 0.411190053836, FILLET3_R), FILLET3_R, 225.296045218, 44.703954782)
            Line((-FILLET3_R * 0.292253709504, FILLET3_R * 0.289249078918), (0, 0))
            Line((0, 0), (FILLET3_R * 0.411190053836, 0))
        make_face()
    extrude(amount=35.535400168, mode=Mode.SUBTRACT)
    with BuildSketch(Plane(origin=(-732.188194017, -202.904651, 270.850357431), x_dir=(0.993529568575603, 0, -0.11357374857763594), z_dir=(-0.11357374857763593, 0, -0.993529568575603))) as fillet3_piece_2:
        with BuildLine():
            CenterArc((FILLET3_R * 0.421124757706, FILLET3_R), FILLET3_R, 224.325671398, 45.674328602)
            Line((-FILLET3_R * 0.294254978904, FILLET3_R * 0.301264118248), (0, 0))
            Line((0, 0), (FILLET3_R * 0.421124757706, 0))
        make_face()
    extrude(amount=25.618457044, mode=Mode.SUBTRACT)
    with BuildSketch(Plane(origin=(-727.59246143, -202.904651, 311.053276428), x_dir=(-0.6942147591455071, -0.7153797366098971, 0.07935805335629142), z_dir=(-0.11357374857763593, 0, -0.993529568575603))) as fillet3_piece_3:
        with BuildLine():
            CenterArc((FILLET3_R * 0.421124757706, -FILLET3_R), FILLET3_R, 90, 45.674328602)
            Line((-FILLET3_R * 0.294254978904, -FILLET3_R * 0.301264118248), (0, 0))
            Line((0, 0), (FILLET3_R * 0.421124757706, 0))
        make_face()
    extrude(amount=36.03680755, mode=Mode.SUBTRACT)
    with BuildSketch(Plane(origin=(-749.5, -187.241004537, 300.449307839), x_dir=(-0.7034437633396176, -0.7059941354664443, -0.08209234133330717), z_dir=(0, 0.11550085817456394, -0.9933073803012537))) as fillet3_piece_4:
        with BuildLine():
            CenterArc((FILLET3_R * 0.411190053836, FILLET3_R), FILLET3_R, 225.296045218, 44.703954782)
            Line((-FILLET3_R * 0.292253709504, FILLET3_R * 0.289249078918), (0, 0))
            Line((0, 0), (FILLET3_R * 0.411190053836, 0))
        make_face()
    extrude(amount=25.114719229, mode=Mode.SUBTRACT)

    # Sketch23 → Cut-Extrude16 (cut, two sides: drawn at the far end of the back side and taken through both)
    with BuildSketch(Plane(origin=(0, -152.4, 0), x_dir=(1, 0, 0), z_dir=(0, 1, 0)).offset(-CUT_EXTRUDE16_DEPTH_BACK)):
        with Locations((-782.928053855, -273.05)):
            Rectangle(SKETCH23_W, SKETCH23_H)
    extrude(amount=CUT_EXTRUDE16_DEPTH + CUT_EXTRUDE16_DEPTH_BACK, mode=Mode.SUBTRACT)

    # Chamfer1
    # the kernel refuses this chamfer: 17.3482 mm, written as the material it adds along each edge
    with BuildSketch(Plane(origin=(-768.694953665, -169.738621, 290.074979713), x_dir=(-1, 0, 0), z_dir=(0, 0, -1))) as chamfer1_piece_1_section:
        Polygon((CHAMFER1_SIZE, 0), (0, CHAMFER1_SIZE), (0, 0), align=None)
    chamfer1_piece_1 = extrude(amount=34.049959426, mode=Mode.PRIVATE)
    chamfer1_piece_1 = split(chamfer1_piece_1, bisect_by=Plane(origin=(-768.694953665, -152.4, 290.074979713), z_dir=(0, -1, 0)), keep=Keep.TOP, mode=Mode.PRIVATE)
    add(chamfer1_piece_1)

    # Chamfer2: read off the stored shape, not the designer's step
    # Chamfer2 outline → Chamfer2 (cut)
    with BuildSketch(Plane(origin=(0, 0, 0), x_dir=(1, 0, 0), z_dir=(0, 1, 0)).offset(CHAMFER2_START)):
        with BuildLine():
            ThreePointArc((-776.780335722, -205.827215697), (-778.25040932, -205.244712218), (-779.787979207, -204.875516434))
            Line((-779.787979207, -204.875516434), (-776.780335722, -205.827215697))
        make_face()
    extrude(amount=CHAMFER2_DEPTH, mode=Mode.SUBTRACT)

    # Chamfer2 2 outline → Chamfer2 2 (add)
    with BuildSketch(Plane(origin=(0, 0, 0), x_dir=(1, 0, 0), z_dir=(0, 1, 0)).offset(CHAMFER2_START)):
        with BuildLine():
            Line((-779.787979207, -204.875516434), (-787.636154045, -202.392142911))
            Line((-787.636154045, -202.392142911), (-787.636154045, -206.480165916))
            ThreePointArc((-787.636154045, -206.480165916), (-783.860774681, -204.950525441), (-779.787979207, -204.875516434))
        make_face()
    extrude(amount=CHAMFER2_2_DEPTH)

    # Chamfer3
    chamfer3_edges = [part.edges().sort_by_distance(p)[0] for p in [
        (-731.419, -206.707684668, 256.025020287),
    ]]
    chamfer3_side = [part.faces().sort_by_distance(p)[0] for p in [
        (-762.95297508, -193.800929084, 256.025020287),
    ]]
    chamfer(chamfer3_edges, length=CHAMFER3_SIZE, length2=CHAMFER3_SIZE2, reference=chamfer3_side[0])

    # Chamfer4: one chamfer whose edges measure the first distance from different faces: ONE call of the kernel's chamfer builder (chamfer() names one face for all edges)
    chamfer4_edges_1 = [part.edges().sort_by_distance(p)[0] for p in [
        (-755.588729488, -170.33440865, 256.025020287),
    ]]
    chamfer4_side_1 = [part.faces().sort_by_distance(p)[0] for p in [
        (-763.393423187, -193.595325956, 256.025020287),
    ]]
    chamfer4_edges_2 = [part.edges().sort_by_distance(p)[0] for p in [
        (-755.588729488, -167.4, 290.074979713),
    ]]
    chamfer4_side_2 = [part.faces().sort_by_distance(p)[0] for p in [
        (-768.5704824, -193.114216517, 290.074979713),
    ]]
    chamfer4 = BRepFilletAPI_MakeChamfer(part.part.solid().wrapped)
    for e in chamfer4_edges_1:
        chamfer4.Add(CHAMFER4_SIZE, CHAMFER4_SIZE2, e.wrapped, chamfer4_side_1[0].wrapped)  # the first distance lies on this face
    for e in chamfer4_edges_2:
        chamfer4.Add(CHAMFER4_SIZE, CHAMFER4_SIZE2, e.wrapped, chamfer4_side_2[0].wrapped)  # the first distance lies on this face
    add(Compound.cast(chamfer4.Shape()), mode=Mode.REPLACE)


solid = part.part
